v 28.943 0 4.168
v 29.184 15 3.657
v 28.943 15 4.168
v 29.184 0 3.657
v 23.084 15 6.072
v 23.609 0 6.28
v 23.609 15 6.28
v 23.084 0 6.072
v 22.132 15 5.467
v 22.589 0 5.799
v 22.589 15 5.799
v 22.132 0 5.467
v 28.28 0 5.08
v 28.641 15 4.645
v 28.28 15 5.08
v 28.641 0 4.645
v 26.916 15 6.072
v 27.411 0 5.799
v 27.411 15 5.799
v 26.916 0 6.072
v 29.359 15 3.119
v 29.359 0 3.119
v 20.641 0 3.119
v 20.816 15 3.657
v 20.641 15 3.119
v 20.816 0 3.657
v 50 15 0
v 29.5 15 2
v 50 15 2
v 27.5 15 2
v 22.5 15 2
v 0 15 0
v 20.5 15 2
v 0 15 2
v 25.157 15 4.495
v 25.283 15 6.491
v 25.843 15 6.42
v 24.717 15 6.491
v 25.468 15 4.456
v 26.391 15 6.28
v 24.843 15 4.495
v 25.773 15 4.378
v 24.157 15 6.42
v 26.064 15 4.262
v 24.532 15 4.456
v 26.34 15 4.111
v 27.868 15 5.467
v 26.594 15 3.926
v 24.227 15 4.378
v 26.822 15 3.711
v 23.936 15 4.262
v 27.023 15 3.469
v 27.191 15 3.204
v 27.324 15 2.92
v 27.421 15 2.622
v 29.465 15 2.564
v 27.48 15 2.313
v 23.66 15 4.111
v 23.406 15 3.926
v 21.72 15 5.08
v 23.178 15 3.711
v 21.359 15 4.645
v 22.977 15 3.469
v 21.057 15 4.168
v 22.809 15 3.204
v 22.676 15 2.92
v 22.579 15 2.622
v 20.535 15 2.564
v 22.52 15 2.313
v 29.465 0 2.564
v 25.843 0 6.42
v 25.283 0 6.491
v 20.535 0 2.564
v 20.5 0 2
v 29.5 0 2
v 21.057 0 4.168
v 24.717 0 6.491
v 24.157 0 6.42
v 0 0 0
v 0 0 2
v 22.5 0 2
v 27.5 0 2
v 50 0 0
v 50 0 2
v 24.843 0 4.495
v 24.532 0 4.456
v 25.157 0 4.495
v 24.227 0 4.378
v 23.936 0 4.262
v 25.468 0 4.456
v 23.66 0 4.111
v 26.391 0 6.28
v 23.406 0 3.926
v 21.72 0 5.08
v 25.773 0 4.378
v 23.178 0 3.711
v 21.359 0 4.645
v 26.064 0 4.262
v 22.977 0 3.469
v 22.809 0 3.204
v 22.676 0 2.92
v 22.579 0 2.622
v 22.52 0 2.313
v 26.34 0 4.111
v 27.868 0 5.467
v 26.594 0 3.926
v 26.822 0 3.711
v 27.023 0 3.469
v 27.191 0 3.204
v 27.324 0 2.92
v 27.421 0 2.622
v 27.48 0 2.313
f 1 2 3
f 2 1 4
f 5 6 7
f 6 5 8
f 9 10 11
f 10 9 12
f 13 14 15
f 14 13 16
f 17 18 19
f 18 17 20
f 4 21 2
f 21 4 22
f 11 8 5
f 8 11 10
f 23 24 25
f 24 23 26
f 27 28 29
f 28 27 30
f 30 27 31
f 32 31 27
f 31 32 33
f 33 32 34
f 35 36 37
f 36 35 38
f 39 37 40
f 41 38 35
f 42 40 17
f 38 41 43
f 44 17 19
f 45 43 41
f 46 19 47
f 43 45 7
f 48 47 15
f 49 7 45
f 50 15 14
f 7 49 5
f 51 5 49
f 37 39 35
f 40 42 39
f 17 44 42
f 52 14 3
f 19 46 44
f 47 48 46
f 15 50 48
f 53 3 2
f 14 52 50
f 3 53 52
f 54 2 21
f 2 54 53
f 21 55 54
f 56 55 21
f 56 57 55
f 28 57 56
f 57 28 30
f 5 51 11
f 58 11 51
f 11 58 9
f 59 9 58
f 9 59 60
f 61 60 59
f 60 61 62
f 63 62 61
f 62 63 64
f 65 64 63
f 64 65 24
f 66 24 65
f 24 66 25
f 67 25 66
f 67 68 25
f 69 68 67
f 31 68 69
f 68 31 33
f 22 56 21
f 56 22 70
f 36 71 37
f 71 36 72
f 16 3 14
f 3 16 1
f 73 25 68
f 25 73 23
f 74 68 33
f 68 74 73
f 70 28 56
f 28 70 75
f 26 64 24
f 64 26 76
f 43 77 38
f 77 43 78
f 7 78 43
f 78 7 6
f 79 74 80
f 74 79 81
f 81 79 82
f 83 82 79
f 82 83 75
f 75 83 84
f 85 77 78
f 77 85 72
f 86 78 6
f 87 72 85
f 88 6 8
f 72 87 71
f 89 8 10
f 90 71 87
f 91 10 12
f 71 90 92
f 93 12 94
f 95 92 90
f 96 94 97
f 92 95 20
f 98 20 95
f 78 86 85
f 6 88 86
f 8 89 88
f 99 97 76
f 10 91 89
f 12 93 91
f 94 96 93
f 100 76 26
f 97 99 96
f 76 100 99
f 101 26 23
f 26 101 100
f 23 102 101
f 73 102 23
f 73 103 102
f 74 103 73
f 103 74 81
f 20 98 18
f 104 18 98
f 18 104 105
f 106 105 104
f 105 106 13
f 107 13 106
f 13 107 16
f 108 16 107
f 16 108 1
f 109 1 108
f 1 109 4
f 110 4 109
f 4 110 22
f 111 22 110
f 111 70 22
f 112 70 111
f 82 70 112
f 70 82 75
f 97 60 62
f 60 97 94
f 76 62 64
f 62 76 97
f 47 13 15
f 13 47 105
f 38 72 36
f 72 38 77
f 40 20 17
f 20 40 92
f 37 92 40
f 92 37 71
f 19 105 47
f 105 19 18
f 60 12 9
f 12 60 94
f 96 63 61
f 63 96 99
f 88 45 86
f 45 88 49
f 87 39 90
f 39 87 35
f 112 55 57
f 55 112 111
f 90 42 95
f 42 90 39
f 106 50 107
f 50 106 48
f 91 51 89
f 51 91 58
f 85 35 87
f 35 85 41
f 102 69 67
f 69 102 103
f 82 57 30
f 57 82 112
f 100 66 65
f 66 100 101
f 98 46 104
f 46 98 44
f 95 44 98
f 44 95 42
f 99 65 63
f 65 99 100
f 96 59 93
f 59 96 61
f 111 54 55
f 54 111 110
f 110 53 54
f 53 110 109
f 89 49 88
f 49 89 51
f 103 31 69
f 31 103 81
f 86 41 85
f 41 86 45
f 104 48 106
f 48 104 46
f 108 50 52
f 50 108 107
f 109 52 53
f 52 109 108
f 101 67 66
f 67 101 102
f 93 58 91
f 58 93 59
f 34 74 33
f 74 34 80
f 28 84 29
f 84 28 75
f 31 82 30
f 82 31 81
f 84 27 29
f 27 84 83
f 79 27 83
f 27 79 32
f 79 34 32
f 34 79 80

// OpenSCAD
$fn = 50;

/* Ceiling Loop Mount */

/* [Enable/Disable Loops] */
loop_pos = "c"; // [c:Center, 1e: Edge, 2e: Edge Pair, s:Sides, a:All]

/* [Mounting Strip Base]  */
/* Command Strip dimentions is typically 50mmx15mm */
sx = 50 ; // length of mounting strip base
sy = 15 ; // widith of mounting strip base
sh = 2  ; // height of mounting strip base

/* [Loop Sizing] */
lt = 2; // loop thickness
lh = 5; // loop holesize

/* Hook function and module */
function loop_width(thickness, holesize) = holesize+thickness*2;
module hook(x, z, thickness, holesize)
{
    /* Hook centre */
    translate([x, 0  , z])
    difference()
    {
        outerdia = (holesize+thickness*2);
        rotate([-90,0,0])
            cylinder(r=outerdia/2, h=sy);
        #translate([0, -1  , 0])
            rotate([-90,,0])
            cylinder(r=holesize/2, h=sy+1);
        #translate([-outerdia/2  , -1/2  , -outerdia/2])
            cube([outerdia,sy+1,outerdia/2]);
    }
}

union() {
    translate([0  , 0  , 0])
        cube([sx,sy,sh]);
    
    if ((loop_pos == "a")||(loop_pos == "c")||(loop_pos == "2e"))
        hook(sx/2, sh, lt, lh);
    if ((loop_pos == "a")||(loop_pos == "s")||(loop_pos == "2e")||(loop_pos == "1e"))
        hook(loop_width(lt, lh)/2, sh, lt, lh);
    if ((loop_pos == "a")||(loop_pos == "s"))
        hook(sx-loop_width(lt, lh)/2, sh, lt, lh);
} 
